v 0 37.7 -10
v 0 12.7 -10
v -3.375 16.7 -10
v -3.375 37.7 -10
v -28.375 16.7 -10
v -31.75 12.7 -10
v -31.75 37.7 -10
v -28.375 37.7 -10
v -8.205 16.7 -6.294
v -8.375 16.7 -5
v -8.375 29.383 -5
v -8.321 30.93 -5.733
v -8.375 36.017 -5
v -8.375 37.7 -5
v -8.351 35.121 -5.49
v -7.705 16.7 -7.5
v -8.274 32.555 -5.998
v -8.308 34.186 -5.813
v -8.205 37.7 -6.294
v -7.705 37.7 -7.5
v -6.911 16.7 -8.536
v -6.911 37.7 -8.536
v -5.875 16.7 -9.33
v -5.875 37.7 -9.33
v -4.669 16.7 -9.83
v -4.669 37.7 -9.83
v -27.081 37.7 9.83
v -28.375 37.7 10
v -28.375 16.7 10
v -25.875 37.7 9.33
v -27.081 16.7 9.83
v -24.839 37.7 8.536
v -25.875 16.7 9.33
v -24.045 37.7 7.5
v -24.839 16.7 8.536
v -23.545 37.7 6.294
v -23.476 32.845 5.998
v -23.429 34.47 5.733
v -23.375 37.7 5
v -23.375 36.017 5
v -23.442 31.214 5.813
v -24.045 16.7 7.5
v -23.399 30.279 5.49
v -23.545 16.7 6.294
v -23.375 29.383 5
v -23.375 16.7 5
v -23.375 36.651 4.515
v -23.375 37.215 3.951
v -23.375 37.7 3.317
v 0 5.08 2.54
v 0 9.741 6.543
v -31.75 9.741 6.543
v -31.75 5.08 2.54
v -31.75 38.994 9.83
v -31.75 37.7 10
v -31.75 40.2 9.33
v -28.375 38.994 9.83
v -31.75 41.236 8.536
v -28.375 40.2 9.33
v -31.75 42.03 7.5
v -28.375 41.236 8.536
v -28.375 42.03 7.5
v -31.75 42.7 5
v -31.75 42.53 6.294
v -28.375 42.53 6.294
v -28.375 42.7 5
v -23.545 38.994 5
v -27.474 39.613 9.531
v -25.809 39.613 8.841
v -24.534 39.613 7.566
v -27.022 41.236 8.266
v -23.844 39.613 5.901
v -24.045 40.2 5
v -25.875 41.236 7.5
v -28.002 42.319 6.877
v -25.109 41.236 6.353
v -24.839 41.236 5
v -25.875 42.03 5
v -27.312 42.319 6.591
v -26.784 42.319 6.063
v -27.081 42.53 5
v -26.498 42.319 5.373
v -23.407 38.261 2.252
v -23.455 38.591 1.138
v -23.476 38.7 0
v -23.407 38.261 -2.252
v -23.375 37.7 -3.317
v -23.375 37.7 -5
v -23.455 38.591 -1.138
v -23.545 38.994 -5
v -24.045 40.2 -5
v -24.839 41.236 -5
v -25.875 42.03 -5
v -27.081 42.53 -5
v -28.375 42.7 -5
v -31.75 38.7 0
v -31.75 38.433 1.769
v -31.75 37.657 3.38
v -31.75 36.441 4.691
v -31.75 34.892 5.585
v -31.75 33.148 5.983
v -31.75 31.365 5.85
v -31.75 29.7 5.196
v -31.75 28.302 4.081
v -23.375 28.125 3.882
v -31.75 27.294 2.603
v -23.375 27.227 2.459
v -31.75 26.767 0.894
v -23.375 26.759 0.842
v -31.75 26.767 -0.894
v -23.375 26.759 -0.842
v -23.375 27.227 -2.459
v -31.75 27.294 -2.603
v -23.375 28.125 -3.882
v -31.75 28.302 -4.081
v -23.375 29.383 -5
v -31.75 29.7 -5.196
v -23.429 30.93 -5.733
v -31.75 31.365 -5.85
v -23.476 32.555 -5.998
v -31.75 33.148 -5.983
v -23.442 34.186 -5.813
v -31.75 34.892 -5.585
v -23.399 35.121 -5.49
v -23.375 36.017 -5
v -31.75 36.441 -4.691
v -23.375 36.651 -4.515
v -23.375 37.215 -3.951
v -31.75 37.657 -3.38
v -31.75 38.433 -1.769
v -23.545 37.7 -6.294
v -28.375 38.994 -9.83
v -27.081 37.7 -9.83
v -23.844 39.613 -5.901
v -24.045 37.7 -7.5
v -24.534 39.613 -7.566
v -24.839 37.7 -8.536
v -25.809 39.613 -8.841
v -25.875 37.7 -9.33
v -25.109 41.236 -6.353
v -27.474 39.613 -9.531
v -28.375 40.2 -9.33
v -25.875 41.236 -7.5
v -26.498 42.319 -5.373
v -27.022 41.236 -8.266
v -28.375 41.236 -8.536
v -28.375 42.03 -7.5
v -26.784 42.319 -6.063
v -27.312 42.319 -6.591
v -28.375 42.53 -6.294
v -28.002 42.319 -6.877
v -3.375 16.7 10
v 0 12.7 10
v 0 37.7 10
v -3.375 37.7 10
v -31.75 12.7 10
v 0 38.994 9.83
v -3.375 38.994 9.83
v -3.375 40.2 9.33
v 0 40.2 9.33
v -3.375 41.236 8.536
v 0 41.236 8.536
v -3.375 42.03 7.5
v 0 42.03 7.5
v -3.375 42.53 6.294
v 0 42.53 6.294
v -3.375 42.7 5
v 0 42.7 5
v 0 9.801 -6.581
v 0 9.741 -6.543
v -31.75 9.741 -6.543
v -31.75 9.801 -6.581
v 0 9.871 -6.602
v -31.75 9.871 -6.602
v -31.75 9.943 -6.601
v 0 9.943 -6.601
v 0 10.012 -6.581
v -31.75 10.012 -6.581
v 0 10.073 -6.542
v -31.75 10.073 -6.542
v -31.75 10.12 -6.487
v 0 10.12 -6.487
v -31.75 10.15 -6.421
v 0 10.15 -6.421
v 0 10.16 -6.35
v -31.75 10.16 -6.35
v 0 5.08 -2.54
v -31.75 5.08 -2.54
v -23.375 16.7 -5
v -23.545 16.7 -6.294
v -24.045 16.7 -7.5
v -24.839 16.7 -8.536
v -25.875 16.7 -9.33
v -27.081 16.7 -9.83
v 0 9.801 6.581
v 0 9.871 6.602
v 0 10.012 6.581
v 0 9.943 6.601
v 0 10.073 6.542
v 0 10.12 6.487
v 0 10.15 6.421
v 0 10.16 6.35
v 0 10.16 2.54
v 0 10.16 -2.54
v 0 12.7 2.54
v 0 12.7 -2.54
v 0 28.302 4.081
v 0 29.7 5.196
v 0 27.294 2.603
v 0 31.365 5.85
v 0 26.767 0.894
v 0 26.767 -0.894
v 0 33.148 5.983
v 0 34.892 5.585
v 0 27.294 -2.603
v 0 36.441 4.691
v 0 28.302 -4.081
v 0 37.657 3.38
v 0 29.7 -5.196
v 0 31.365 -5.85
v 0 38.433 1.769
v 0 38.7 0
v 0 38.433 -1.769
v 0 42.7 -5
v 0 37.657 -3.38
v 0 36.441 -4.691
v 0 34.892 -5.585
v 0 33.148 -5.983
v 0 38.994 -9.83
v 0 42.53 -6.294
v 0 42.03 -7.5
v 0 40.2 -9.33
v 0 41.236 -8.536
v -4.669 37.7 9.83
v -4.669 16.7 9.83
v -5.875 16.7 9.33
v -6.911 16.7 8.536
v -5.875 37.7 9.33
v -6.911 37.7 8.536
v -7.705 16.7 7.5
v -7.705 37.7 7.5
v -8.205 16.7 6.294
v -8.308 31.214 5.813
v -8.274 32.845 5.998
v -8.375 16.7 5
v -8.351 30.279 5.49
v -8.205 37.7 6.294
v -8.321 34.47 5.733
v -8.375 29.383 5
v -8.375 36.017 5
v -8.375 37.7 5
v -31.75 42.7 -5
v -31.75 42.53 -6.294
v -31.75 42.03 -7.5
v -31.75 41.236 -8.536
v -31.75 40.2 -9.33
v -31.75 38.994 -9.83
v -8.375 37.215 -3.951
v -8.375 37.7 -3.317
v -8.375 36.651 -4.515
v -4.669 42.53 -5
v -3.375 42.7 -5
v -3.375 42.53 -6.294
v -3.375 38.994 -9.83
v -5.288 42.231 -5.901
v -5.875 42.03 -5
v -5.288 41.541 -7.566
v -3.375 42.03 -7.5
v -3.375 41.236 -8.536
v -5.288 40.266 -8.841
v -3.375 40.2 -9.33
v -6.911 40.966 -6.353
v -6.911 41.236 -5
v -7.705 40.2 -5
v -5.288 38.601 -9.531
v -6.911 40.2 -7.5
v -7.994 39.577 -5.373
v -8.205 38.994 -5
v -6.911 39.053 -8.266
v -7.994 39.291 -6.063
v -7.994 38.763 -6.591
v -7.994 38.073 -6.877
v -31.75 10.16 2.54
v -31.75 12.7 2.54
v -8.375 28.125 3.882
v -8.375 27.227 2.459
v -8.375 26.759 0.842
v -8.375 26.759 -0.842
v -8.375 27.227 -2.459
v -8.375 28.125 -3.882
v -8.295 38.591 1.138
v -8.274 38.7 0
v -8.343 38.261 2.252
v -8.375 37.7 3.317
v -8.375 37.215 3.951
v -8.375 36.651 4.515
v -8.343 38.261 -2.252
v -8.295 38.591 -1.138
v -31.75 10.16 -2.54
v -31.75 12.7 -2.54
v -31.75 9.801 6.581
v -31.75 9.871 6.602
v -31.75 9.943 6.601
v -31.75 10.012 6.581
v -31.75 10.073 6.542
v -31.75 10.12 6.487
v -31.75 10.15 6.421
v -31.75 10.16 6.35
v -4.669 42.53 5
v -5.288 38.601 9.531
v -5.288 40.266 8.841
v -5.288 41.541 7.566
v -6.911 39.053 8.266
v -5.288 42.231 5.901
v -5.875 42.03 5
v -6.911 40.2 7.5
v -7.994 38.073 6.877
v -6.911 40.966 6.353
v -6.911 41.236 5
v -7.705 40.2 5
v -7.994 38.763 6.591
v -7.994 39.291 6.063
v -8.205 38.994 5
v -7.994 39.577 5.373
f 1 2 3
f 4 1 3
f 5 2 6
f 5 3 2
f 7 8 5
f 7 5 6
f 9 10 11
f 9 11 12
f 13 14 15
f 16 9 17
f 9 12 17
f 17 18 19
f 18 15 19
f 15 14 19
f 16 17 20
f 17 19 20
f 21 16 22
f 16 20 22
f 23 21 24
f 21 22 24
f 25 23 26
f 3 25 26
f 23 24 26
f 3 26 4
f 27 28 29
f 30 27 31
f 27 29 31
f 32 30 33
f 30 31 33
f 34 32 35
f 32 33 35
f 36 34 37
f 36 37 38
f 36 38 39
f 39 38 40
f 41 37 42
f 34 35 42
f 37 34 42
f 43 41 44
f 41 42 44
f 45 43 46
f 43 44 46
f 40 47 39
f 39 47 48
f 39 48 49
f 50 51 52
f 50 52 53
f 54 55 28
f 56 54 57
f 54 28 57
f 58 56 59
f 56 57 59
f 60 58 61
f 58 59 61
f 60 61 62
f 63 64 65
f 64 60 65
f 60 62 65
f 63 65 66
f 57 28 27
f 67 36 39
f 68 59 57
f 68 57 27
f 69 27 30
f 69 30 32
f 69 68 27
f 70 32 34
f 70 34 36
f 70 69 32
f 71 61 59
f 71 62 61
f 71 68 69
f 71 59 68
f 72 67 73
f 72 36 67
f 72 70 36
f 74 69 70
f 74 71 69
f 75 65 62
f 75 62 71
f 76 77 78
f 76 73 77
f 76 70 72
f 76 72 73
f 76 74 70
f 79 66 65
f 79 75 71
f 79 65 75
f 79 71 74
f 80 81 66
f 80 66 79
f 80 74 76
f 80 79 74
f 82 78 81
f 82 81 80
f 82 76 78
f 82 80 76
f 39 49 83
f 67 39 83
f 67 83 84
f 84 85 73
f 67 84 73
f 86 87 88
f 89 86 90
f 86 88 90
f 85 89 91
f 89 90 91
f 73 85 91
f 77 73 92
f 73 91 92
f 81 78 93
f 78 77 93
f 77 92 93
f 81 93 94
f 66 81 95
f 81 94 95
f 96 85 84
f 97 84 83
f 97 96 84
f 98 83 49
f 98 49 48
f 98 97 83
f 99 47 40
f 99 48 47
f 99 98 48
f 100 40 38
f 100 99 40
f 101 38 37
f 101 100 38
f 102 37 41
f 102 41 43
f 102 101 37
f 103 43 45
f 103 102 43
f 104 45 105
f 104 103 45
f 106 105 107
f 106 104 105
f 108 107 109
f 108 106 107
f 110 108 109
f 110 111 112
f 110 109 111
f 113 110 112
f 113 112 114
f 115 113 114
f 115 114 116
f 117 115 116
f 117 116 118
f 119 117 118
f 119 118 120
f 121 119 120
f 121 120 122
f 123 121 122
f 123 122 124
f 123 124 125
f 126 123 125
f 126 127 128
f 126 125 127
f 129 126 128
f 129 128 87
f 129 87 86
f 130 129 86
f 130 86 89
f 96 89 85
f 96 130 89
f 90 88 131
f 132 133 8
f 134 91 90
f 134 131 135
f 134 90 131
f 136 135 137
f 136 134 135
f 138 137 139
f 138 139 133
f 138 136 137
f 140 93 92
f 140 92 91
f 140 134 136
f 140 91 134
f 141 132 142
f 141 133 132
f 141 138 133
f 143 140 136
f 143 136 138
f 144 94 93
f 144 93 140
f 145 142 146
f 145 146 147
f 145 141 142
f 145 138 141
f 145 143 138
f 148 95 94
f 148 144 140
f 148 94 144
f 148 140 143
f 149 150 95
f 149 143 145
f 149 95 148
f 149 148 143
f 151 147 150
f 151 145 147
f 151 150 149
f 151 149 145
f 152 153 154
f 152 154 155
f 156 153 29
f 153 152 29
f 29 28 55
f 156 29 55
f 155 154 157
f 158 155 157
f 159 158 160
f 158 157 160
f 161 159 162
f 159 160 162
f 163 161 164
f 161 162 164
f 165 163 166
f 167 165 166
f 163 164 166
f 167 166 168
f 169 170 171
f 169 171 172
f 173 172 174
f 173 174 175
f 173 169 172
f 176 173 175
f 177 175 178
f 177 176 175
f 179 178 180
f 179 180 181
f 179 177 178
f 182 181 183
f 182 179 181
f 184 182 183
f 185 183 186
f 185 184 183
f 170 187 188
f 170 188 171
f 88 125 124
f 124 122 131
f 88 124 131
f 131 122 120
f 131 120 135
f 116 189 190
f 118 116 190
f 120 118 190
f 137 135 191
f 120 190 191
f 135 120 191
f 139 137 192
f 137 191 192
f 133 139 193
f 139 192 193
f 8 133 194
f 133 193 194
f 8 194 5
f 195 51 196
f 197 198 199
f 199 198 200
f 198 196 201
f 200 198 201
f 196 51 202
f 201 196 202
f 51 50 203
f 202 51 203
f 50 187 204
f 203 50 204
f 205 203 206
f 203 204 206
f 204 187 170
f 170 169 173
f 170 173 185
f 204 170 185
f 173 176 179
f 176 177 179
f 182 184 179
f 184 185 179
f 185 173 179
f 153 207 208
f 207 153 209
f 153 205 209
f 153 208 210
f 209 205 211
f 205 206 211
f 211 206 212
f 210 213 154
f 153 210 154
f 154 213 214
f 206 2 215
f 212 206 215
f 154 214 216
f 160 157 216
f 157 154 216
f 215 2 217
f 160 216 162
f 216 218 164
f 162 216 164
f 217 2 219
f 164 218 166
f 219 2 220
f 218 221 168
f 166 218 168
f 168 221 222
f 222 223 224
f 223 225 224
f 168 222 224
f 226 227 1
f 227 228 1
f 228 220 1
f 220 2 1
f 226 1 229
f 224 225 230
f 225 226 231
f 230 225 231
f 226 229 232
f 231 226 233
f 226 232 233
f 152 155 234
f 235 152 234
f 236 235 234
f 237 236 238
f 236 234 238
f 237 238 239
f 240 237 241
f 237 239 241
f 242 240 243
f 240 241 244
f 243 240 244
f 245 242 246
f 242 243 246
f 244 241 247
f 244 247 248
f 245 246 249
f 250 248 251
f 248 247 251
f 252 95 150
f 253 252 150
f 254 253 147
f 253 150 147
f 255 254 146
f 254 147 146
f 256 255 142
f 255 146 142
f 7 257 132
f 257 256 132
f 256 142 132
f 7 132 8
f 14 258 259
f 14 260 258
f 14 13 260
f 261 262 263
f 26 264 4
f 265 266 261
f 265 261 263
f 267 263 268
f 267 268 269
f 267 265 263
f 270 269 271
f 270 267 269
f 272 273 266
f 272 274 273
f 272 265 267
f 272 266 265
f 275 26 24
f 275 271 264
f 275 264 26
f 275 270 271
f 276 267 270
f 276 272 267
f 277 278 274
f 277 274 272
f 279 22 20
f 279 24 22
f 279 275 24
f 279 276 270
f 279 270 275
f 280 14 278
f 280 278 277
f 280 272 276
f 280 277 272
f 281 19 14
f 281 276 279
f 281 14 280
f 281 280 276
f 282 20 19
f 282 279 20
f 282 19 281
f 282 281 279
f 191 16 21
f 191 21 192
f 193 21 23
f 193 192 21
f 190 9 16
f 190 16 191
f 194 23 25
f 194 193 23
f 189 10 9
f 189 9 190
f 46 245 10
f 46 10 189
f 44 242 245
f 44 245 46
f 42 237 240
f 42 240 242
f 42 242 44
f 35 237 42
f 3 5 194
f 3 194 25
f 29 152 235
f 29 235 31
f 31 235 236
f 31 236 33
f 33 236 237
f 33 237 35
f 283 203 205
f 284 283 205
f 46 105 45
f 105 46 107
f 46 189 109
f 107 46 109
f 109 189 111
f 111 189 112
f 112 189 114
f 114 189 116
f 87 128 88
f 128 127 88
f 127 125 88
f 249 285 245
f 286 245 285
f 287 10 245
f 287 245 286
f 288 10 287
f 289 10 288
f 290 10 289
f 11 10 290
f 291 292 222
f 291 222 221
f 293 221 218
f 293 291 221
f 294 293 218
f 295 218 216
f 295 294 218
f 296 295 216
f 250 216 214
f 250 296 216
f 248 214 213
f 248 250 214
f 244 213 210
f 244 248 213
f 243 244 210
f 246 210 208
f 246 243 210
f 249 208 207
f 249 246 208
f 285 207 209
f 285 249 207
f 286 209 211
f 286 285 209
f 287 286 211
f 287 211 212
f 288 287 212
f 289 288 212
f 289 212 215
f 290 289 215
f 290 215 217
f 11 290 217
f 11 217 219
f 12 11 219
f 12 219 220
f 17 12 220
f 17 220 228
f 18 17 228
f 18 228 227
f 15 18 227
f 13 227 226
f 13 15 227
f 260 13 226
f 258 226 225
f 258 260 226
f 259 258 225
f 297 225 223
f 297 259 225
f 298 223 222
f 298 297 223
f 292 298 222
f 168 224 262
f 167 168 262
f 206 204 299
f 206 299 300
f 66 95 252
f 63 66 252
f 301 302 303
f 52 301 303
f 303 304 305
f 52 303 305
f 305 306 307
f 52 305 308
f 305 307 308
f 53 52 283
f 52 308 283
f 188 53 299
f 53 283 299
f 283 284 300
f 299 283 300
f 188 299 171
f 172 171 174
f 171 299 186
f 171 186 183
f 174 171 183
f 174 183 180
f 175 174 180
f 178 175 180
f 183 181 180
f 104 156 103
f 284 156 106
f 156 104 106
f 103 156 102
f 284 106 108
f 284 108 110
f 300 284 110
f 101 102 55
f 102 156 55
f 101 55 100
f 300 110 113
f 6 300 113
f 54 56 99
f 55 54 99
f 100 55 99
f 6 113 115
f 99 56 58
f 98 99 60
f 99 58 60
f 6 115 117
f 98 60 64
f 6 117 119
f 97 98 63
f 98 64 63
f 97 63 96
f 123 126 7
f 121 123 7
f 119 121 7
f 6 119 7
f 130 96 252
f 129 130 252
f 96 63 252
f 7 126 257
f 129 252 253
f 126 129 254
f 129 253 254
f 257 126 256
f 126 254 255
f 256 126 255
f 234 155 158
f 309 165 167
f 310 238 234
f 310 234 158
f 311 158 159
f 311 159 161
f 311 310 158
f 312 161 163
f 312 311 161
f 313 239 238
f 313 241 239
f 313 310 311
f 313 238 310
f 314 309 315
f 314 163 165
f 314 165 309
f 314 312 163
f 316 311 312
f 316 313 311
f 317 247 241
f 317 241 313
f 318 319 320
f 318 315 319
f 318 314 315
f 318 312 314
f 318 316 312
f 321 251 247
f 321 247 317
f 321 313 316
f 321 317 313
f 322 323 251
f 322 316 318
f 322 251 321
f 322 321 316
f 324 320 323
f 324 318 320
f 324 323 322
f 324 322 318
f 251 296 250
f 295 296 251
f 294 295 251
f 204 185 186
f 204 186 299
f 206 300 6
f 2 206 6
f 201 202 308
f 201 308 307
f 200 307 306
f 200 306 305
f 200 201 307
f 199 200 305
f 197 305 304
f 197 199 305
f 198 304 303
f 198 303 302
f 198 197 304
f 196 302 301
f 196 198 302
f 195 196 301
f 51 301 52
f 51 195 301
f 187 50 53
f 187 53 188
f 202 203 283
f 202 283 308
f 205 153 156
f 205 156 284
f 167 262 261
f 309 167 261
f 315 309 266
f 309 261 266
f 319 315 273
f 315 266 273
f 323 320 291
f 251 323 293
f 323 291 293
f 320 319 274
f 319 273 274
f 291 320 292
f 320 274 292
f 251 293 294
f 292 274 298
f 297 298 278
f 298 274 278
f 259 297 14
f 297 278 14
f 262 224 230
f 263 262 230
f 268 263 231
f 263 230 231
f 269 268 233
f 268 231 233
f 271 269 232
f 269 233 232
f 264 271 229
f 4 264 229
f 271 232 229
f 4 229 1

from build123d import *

# Parameters (mm, degrees)
SKETCH10_W              = 2.54
SKETCH10_H              = 5.08
SKETCH10_W_2            = 5.08
SKETCH10_H_2            = 2.54
BOSS_EXTRUDE3_DEPTH     = 31.75
SKETCH11_W              = 20
SKETCH11_H              = 4
BOSS_EXTRUDE4_DEPTH     = 31.75
CUT_EXTRUDE1_DEPTH      = 39.055781427
SKETCH13_W              = 8.375
SKETCH13_H              = 26
BOSS_EXTRUDE5_DEPTH     = 20
CUT_EXTRUDE2_DEPTH      = 50.695881369
CUT_EXTRUDE2_DEPTH_BACK = 50.695881369
SKETCH16_R              = 6
FILLET1_R               = 5


with BuildPart() as part:
    # Sketch10 → Boss-Extrude3 (new body)
    with BuildSketch(Plane(origin=(0, 0, 0), x_dir=(0, 0, -1), z_dir=(1, 0, 0))):
        with Locations((-11.43, 0)):
            Rectangle(SKETCH10_W, SKETCH10_H)
        with BuildLine():
            Line((-5.08, 2.54), (-9.740509205, 6.542688341))
            ThreePointArc((-9.740509205, 6.542688341), (-10.012022021, 6.580814495), (-10.16, 6.35))
            Line((-10.16, 6.35), (-10.16, -6.35))
            ThreePointArc((-10.16, -6.35), (-10.012022021, -6.580814495), (-9.740509205, -6.542688341))
            Line((-9.740509205, -6.542688341), (-5.08, -2.54))
            Line((-5.08, -2.54), (-5.08, 2.54))
        make_face()
        with BuildLine():
            Line((6.35, 10.16), (-6.35, 10.16))
            ThreePointArc((-6.35, 10.16), (-6.580814495, 10.012022021), (-6.542688341, 9.740509205))
            Line((-6.542688341, 9.740509205), (-2.54, 5.08))
            Line((-2.54, 5.08), (2.54, 5.08))
            Line((2.54, 5.08), (6.542688341, 9.740509205))
            ThreePointArc((6.542688341, 9.740509205), (6.580814495, 10.012022021), (6.35, 10.16))
        make_face()
        with Locations((0, 11.43)):
            Rectangle(SKETCH10_W_2, SKETCH10_H_2)
        with BuildLine():
            ThreePointArc((6.542688341, -9.740509205), (6.580814495, -10.012022021), (6.35, -10.16))
            Line((6.35, -10.16), (-6.35, -10.16))
            ThreePointArc((-6.35, -10.16), (-6.580814495, -10.012022021), (-6.542688341, -9.740509205))
            Line((-6.542688341, -9.740509205), (-2.54, -5.08))
            Line((-2.54, -5.08), (2.54, -5.08))
            Line((2.54, -5.08), (6.542688341, -9.740509205))
        make_face()
        with Locations((0, -11.43)):
            Rectangle(SKETCH10_W_2, SKETCH10_H_2)
        with BuildLine():
            Line((5.08, 2.54), (5.08, -2.54))
            Line((5.08, -2.54), (9.740509205, -6.542688341))
            ThreePointArc((9.740509205, -6.542688341), (10.012022021, -6.580814495), (10.16, -6.35))
            Line((10.16, -6.35), (10.16, -2.54))
            Line((10.16, -2.54), (10.16, 2.54))
            Line((10.16, 2.54), (10.16, 6.35))
            ThreePointArc((10.16, 6.35), (10.012022021, 6.580814495), (9.740509205, 6.542688341))
            Line((9.740509205, 6.542688341), (5.08, 2.54))
        make_face()
        with Locations((11.43, 0)):
            Rectangle(SKETCH10_W, SKETCH10_H)
    extrude(amount=-BOSS_EXTRUDE3_DEPTH)

    # Sketch11 → Boss-Extrude4 (add)
    with BuildSketch(Plane(origin=(0, 0, 0), x_dir=(0, 0, -1), z_dir=(1, 0, 0))):
        with Locations((0, 14.7)):
            Rectangle(SKETCH11_W, SKETCH11_H)
    extrude(amount=-BOSS_EXTRUDE4_DEPTH)

    # Sketch12 → Cut-Extrude1 (cut, through all)
    with BuildSketch(Plane.ZY.offset(31.75)):
        Polygon((0, 0), (-15.483602638, 16.020997712), (-15.483602638, -14.964233499), (16.01610749, -14.964233499), (16.01610749, 15.47887645), align=None)
    extrude(amount=-CUT_EXTRUDE1_DEPTH, mode=Mode.SUBTRACT)

    # Sketch13 → Boss-Extrude5 (add, through all)
    with BuildSketch(Plane(origin=(0, 0, -10), x_dir=(-1, 0, 0), z_dir=(0, 0, -1))):
        with Locations((4.1875, 29.7)):
            Rectangle(SKETCH13_W, SKETCH13_H)
        with Locations((27.5625, 29.7)):
            Rectangle(SKETCH13_W, SKETCH13_H)
    extrude(amount=-BOSS_EXTRUDE5_DEPTH)

    # Sketch16 → Cut-Extrude2 (cut, two sides: drawn at the far end of the back side and taken through both)
    with BuildSketch(Plane(origin=(-23.375, 0, 0), x_dir=(0, 0, -1), z_dir=(1, 0, 0)).offset(-CUT_EXTRUDE2_DEPTH_BACK)):
        with Locations(Location((0, 32.7, 0), (0, 0, 90))):
            Circle(SKETCH16_R)
    extrude(amount=CUT_EXTRUDE2_DEPTH + CUT_EXTRUDE2_DEPTH_BACK, mode=Mode.SUBTRACT)

    # Fillet1
    # the kernel refuses this fillet: 5 mm, written as the material it takes off along each edge
    with BuildSketch(Plane(origin=(-3.375, 37.7, 5), x_dir=(0, 1, 0), z_dir=(-1, 0, 0))) as fillet1_piece_1_section:
        Polygon((0, 0), (FILLET1_R * 1.02, 0), (FILLET1_R * 1.02, -FILLET1_R * 1.02), (0, -FILLET1_R * 1.02), align=None)
    fillet1_piece_1 = extrude(amount=FILLET1_R * 1.02, mode=Mode.PRIVATE)
    fillet1_piece_1 = fillet1_piece_1 - Plane(origin=(-3.375, 37.7, 5), x_dir=(0, -0.7071067811865475, -0.7071067811865475), z_dir=(-1, 0, 0)) * Sphere(FILLET1_R, mode=Mode.PRIVATE)
    add(fillet1_piece_1, mode=Mode.SUBTRACT)
    with BuildSketch(Plane(origin=(-3.375, 37.7, -5), x_dir=(0, 0, -1), z_dir=(-1, 0, 0))) as fillet1_piece_2_section:
        Polygon((0, 0), (FILLET1_R * 1.02, 0), (FILLET1_R * 1.02, -FILLET1_R * 1.02), (0, -FILLET1_R * 1.02), align=None)
    fillet1_piece_2 = extrude(amount=FILLET1_R * 1.02, mode=Mode.PRIVATE)
    fillet1_piece_2 = fillet1_piece_2 - Plane(origin=(-3.375, 37.7, -5), x_dir=(0, -0.7071067811865475, 0.7071067811865475), z_dir=(-1, 0, 0)) * Sphere(FILLET1_R, mode=Mode.PRIVATE)
    add(fillet1_piece_2, mode=Mode.SUBTRACT)
    with BuildSketch(Plane(origin=(-28.375, 37.7, 5), x_dir=(1, 0, 0), z_dir=(0, 1, 0))) as fillet1_piece_3_section:
        Polygon((0, 0), (FILLET1_R * 1.02, 0), (FILLET1_R * 1.02, -FILLET1_R * 1.02), (0, -FILLET1_R * 1.02), align=None)
    fillet1_piece_3 = extrude(amount=FILLET1_R * 1.02, mode=Mode.PRIVATE)
    fillet1_piece_3 = fillet1_piece_3 - Plane(origin=(-28.375, 37.7, 5), x_dir=(-0.7071067811865475, 0, -0.7071067811865475), z_dir=(0, 1, 0)) * Sphere(FILLET1_R, mode=Mode.PRIVATE)
    add(fillet1_piece_3, mode=Mode.SUBTRACT)
    with BuildSketch(Plane(origin=(-28.375, 37.7, -5), x_dir=(1, 0, 0), z_dir=(0, 1, 0))) as fillet1_piece_4_section:
        Polygon((0, 0), (FILLET1_R * 1.02, 0), (FILLET1_R * 1.02, FILLET1_R * 1.02), (0, FILLET1_R * 1.02), align=None)
    fillet1_piece_4 = extrude(amount=FILLET1_R * 1.02, mode=Mode.PRIVATE)
    fillet1_piece_4 = fillet1_piece_4 - Plane(origin=(-28.375, 37.7, -5), x_dir=(-0.7071067811865475, 0, 0.7071067811865475), z_dir=(0, 1, 0)) * Sphere(FILLET1_R, mode=Mode.PRIVATE)
    add(fillet1_piece_4, mode=Mode.SUBTRACT)
    with BuildSketch(Plane(origin=(12.5, 42.7, 10), x_dir=(0, 0, -1), z_dir=(-1, 0, 0)), Plane(origin=(12.5, 42.7, -10), x_dir=(0, -1, 0), z_dir=(-1, 0, 0)), Plane(origin=(-28.375, 42.7, -10), x_dir=(0, -1, 0), z_dir=(-1, 0, 0))) as fillet1_piece_5:
        with BuildLine():
            CenterArc((FILLET1_R, FILLET1_R), FILLET1_R, 180, 90)
            Line((0, FILLET1_R), (0, 0))
            Line((0, 0), (FILLET1_R, 0))
        make_face()
    extrude(amount=15.875, mode=Mode.SUBTRACT)
    with BuildSketch(Plane(origin=(-8.375, 37.7, 10), x_dir=(1, 0, 0), z_dir=(0, -1, 0)), Plane(origin=(-23.375, 16.7, 10), x_dir=(-1, 0, 0), z_dir=(0, 1, 0))) as fillet1_piece_6:
        with BuildLine():
            CenterArc((FILLET1_R, -FILLET1_R), FILLET1_R, 90, 90)
            Line((0, -FILLET1_R), (0, 0))
            Line((0, 0), (FILLET1_R, 0))
        make_face()
    extrude(amount=21, mode=Mode.SUBTRACT)
    with BuildSketch(Plane(origin=(-8.375, 42.7, -5), x_dir=(1, 0, 0), z_dir=(0, 0, 1))) as fillet1_piece_7:
        with BuildLine():
            CenterArc((FILLET1_R, -FILLET1_R), FILLET1_R, 90, 90)
            Line((0, -FILLET1_R), (0, 0))
            Line((0, 0), (FILLET1_R, 0))
        make_face()
    extrude(amount=10, mode=Mode.SUBTRACT)
    with BuildSketch(Plane(origin=(-8.375, 37.7, -10), x_dir=(1, 0, 0), z_dir=(0, -1, 0)), Plane(origin=(-23.375, 16.7, -10), x_dir=(-1, 0, 0), z_dir=(0, 1, 0))) as fillet1_piece_8:
        with BuildLine():
            CenterArc((FILLET1_R, FILLET1_R), FILLET1_R, 180, 90)
            Line((0, FILLET1_R), (0, 0))
            Line((0, 0), (FILLET1_R, 0))
        make_face()
    extrude(amount=21, mode=Mode.SUBTRACT)
    with BuildSketch(Plane(origin=(-28.375, 42.7, 10), x_dir=(0, -1, 0), z_dir=(-1, 0, 0))) as fillet1_piece_9:
        with BuildLine():
            CenterArc((FILLET1_R, -FILLET1_R), FILLET1_R, 90, 90)
            Line((0, -FILLET1_R), (0, 0))
            Line((0, 0), (FILLET1_R, 0))
        make_face()
    extrude(amount=15.875, mode=Mode.SUBTRACT)
    with BuildSketch(Plane(origin=(-23.375, 42.7, -5), x_dir=(-1, 0, 0), z_dir=(0, 0, 1))) as fillet1_piece_10:
        with BuildLine():
            CenterArc((FILLET1_R, FILLET1_R), FILLET1_R, 180, 90)
            Line((0, FILLET1_R), (0, 0))
            Line((0, 0), (FILLET1_R, 0))
        make_face()
    extrude(amount=10, mode=Mode.SUBTRACT)


solid = part.part
